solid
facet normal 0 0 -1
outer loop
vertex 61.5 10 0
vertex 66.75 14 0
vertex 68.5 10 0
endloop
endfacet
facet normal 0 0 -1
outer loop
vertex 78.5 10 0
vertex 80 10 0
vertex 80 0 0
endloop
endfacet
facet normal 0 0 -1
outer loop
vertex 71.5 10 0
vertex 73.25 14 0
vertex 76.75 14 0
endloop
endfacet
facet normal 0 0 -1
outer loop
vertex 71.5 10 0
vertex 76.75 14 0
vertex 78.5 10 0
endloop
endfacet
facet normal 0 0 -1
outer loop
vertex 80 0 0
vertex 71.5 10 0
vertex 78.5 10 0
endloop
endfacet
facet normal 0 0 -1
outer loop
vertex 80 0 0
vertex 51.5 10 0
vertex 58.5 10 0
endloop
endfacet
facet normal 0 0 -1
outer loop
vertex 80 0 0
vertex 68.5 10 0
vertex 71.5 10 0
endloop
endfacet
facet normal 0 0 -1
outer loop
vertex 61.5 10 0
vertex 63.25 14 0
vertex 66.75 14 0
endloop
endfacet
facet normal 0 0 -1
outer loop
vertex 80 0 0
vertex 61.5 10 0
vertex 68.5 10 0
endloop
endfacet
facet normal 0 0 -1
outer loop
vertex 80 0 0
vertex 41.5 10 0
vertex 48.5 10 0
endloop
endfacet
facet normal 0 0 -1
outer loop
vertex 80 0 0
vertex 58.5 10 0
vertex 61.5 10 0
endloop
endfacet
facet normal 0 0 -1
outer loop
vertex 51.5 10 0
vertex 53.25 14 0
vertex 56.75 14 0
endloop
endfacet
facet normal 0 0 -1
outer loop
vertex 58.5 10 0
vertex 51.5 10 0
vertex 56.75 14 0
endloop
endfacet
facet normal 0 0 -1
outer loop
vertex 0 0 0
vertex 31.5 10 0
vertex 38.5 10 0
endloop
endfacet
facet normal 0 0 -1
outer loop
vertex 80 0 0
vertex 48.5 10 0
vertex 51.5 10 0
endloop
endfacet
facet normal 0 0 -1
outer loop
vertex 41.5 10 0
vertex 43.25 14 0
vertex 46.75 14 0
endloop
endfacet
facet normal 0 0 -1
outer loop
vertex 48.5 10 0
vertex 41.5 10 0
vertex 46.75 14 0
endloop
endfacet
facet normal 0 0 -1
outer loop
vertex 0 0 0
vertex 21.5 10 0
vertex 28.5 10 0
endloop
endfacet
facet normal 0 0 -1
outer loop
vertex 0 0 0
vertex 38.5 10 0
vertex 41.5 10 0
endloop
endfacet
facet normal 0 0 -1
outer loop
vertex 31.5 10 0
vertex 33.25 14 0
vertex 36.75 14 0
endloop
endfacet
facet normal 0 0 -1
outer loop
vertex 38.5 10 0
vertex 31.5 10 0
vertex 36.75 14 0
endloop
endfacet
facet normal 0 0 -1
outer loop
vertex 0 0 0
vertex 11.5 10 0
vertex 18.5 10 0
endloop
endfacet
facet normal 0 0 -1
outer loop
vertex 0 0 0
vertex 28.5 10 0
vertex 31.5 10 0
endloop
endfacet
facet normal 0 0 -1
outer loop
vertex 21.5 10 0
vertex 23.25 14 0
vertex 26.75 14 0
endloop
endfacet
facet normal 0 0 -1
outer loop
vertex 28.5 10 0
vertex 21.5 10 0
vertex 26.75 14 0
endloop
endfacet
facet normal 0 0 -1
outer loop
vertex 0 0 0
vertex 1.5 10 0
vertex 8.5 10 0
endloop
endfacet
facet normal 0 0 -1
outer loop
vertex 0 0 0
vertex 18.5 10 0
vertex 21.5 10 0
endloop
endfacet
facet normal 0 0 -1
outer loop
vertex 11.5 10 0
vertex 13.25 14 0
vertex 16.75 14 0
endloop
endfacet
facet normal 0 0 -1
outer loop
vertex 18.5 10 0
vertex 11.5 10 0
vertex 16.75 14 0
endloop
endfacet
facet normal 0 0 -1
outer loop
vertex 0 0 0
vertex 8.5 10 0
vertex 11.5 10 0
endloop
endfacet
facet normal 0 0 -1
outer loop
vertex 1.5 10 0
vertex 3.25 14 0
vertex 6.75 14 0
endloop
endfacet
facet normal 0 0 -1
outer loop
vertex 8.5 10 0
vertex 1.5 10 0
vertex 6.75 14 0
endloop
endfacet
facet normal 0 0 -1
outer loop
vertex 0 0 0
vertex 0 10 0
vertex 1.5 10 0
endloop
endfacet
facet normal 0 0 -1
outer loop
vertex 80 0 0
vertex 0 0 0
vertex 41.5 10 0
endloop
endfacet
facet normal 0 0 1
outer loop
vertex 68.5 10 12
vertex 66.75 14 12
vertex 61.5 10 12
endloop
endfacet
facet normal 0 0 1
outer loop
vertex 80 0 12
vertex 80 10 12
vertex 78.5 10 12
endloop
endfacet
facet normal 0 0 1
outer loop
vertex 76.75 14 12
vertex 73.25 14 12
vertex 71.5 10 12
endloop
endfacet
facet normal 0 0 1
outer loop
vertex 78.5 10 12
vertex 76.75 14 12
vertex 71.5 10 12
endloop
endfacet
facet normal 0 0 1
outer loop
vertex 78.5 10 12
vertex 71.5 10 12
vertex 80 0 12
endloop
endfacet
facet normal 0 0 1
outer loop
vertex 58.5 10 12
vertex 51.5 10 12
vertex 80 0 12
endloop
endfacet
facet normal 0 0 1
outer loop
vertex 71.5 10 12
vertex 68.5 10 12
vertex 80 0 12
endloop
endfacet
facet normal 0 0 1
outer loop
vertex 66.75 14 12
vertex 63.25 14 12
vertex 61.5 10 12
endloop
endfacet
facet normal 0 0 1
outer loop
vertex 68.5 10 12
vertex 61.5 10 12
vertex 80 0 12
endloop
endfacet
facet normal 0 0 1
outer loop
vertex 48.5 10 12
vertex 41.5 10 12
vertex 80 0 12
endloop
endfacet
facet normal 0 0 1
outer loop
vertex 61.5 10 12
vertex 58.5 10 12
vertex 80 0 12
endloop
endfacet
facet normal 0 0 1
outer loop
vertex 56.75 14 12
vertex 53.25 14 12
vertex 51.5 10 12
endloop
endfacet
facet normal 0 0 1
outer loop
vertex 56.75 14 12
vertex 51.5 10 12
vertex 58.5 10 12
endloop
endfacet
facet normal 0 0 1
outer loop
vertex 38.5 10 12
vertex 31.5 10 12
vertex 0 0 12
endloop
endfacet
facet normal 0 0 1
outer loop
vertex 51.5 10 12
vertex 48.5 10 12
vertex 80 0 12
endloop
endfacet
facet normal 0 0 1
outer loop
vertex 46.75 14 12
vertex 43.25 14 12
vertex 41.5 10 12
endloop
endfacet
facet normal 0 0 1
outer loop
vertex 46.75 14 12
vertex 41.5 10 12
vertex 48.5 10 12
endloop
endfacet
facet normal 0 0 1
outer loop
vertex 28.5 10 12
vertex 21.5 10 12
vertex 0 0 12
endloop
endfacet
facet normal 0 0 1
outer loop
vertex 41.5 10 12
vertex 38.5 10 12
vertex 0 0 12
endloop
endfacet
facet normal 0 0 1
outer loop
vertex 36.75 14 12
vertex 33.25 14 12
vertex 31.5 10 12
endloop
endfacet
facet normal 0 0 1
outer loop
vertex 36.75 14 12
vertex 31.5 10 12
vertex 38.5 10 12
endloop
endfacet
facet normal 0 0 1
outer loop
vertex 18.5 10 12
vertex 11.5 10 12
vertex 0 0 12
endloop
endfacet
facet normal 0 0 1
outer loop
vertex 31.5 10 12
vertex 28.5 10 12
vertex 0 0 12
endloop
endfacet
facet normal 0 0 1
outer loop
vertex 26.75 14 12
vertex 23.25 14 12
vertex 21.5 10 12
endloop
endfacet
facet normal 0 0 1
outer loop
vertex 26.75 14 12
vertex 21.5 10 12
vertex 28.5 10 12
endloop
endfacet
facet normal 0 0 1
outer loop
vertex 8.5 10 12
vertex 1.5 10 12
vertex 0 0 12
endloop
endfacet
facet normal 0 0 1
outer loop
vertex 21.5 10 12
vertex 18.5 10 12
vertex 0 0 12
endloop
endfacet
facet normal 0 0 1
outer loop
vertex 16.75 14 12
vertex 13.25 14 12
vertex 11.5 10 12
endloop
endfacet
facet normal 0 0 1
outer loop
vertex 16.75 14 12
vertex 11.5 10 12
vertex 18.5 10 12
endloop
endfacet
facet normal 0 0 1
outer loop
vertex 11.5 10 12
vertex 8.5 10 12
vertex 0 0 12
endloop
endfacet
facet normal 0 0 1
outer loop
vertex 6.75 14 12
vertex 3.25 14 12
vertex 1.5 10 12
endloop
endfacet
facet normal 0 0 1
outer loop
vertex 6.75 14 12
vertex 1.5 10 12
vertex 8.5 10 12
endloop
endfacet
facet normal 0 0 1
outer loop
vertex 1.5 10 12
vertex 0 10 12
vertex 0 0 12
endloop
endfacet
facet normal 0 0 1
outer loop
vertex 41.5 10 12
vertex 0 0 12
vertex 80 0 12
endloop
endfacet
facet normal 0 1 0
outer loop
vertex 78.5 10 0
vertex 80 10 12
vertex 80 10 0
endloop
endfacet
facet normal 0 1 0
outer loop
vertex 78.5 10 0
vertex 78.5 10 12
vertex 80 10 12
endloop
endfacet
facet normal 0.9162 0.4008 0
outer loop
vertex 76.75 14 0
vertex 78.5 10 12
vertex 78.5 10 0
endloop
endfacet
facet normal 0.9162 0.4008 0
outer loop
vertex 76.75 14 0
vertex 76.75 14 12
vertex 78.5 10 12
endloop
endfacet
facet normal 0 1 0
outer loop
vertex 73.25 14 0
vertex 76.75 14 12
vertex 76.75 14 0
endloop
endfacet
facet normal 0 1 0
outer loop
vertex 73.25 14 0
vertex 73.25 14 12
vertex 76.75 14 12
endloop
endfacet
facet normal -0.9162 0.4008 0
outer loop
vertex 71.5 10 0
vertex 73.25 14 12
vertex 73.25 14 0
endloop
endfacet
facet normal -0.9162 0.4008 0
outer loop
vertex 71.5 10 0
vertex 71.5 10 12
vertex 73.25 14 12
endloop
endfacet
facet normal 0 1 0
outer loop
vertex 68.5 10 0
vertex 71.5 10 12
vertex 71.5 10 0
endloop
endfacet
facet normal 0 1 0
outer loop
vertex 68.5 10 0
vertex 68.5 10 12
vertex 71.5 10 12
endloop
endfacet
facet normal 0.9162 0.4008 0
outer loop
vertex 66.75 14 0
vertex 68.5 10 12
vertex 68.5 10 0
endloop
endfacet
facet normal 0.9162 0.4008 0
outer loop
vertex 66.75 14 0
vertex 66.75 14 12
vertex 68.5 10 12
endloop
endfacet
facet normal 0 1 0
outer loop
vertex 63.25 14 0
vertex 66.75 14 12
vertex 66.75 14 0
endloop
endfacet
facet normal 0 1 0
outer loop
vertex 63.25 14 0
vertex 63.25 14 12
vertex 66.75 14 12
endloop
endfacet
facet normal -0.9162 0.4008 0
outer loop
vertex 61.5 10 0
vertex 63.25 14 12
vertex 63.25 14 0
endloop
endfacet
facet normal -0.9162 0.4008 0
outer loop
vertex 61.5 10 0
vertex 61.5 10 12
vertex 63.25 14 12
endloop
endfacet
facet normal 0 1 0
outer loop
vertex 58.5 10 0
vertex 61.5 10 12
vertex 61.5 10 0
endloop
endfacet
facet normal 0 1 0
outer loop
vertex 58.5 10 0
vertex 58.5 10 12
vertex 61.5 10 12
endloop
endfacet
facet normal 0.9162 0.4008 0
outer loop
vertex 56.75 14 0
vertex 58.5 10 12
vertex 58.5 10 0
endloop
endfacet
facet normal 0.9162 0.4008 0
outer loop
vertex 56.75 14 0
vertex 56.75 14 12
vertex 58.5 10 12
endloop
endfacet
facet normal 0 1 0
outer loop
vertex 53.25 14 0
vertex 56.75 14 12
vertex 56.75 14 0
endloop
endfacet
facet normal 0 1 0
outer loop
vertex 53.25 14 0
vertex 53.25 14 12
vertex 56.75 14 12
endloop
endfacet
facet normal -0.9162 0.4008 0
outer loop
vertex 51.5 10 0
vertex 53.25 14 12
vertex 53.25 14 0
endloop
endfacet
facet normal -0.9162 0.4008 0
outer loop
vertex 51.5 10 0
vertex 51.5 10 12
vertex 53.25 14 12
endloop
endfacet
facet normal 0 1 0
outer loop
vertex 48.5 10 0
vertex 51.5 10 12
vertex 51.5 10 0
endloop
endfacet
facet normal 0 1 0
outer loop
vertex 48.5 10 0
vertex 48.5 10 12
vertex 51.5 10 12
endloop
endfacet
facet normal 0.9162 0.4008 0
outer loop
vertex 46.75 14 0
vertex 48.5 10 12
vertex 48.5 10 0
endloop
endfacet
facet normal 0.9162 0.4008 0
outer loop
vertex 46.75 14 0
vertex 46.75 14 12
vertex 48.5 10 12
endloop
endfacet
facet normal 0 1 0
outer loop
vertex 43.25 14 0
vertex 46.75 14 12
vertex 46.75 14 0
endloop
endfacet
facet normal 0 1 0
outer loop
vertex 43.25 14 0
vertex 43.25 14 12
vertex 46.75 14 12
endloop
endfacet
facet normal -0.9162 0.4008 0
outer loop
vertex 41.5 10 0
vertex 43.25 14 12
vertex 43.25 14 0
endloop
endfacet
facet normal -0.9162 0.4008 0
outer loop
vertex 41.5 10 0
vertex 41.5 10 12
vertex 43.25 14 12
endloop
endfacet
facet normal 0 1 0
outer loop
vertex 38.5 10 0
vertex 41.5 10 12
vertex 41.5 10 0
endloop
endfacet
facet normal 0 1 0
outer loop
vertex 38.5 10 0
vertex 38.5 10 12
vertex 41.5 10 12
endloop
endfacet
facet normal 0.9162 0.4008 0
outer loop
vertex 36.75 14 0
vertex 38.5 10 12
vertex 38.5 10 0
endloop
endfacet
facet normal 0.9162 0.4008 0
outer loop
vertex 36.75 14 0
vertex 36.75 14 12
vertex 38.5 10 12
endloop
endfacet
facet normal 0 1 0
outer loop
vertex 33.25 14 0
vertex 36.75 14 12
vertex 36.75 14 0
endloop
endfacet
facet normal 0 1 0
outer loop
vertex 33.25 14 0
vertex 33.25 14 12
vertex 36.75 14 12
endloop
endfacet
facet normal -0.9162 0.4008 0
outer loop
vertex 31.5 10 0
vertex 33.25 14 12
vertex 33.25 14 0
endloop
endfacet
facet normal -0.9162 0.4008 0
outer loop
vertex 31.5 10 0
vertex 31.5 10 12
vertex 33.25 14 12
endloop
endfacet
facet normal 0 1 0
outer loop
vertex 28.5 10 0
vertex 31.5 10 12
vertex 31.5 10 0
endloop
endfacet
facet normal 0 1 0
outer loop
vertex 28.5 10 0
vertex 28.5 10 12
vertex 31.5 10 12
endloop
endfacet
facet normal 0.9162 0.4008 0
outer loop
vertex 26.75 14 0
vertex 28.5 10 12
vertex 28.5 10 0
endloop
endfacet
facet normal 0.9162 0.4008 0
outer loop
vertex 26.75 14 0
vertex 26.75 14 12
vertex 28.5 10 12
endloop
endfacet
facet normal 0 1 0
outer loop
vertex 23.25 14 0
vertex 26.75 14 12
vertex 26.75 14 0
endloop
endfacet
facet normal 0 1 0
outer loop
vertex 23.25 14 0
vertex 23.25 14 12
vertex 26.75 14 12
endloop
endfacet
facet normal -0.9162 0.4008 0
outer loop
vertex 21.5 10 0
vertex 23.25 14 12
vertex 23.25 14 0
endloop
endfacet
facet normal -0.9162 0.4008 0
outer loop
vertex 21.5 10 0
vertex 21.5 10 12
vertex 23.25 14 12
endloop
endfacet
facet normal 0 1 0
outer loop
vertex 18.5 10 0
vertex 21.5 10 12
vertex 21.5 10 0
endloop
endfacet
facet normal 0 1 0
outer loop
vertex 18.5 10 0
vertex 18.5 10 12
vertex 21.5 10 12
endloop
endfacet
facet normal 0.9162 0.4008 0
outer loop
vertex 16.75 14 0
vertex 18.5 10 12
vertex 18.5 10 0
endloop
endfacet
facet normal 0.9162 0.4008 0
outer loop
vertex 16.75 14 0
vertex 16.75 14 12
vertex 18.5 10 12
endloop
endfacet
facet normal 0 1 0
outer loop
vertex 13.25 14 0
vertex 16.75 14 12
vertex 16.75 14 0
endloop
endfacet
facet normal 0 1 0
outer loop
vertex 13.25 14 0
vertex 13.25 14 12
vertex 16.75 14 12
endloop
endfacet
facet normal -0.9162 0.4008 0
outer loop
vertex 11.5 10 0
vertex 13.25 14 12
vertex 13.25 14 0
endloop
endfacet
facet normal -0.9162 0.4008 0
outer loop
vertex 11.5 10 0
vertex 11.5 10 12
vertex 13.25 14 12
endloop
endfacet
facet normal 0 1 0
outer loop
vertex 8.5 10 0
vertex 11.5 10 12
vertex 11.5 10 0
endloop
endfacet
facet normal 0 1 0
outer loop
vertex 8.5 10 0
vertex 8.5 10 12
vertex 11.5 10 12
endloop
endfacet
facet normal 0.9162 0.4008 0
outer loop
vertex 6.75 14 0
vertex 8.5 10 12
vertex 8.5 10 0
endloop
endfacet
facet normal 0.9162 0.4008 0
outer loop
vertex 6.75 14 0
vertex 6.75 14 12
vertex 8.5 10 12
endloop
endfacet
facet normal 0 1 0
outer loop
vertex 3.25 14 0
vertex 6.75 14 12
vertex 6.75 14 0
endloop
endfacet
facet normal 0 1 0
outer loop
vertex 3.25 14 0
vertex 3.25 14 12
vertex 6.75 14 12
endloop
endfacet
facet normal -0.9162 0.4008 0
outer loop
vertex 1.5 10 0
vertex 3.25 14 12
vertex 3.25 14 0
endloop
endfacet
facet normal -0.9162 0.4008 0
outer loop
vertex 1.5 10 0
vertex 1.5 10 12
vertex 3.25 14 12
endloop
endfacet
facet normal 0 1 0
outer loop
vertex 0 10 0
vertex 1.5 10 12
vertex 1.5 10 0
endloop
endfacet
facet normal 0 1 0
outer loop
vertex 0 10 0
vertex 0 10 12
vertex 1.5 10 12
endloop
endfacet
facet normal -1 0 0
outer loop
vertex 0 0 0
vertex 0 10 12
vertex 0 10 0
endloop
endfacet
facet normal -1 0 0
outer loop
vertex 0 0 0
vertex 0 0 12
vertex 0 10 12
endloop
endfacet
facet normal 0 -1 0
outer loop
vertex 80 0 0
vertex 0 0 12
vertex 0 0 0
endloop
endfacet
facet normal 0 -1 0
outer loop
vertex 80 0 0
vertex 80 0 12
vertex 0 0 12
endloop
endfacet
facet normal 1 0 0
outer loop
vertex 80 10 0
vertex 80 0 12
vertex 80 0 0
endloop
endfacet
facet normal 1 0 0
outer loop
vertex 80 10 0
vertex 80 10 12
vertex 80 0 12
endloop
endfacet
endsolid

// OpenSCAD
$fn = 32;

// ----------------------------------------------------------------------
// Gear rack: 8 teeth, pitch 10 mm
// ----------------------------------------------------------------------

// --- parameters (mm) ---
teeth = 8;                // number of teeth
pitch = 10;               // tooth pitch, X
root_w = 7;               // tooth width at the root
tip_w = 3.5;              // tooth width at the tip
base_h = 10;              // rack body height, Y
tooth_h = 4;              // tooth height above the body
plate_t = 12;             // rack width, Z (extrusion height)

rack_l = teeth * pitch;  // overall length
total_h = base_h + tooth_h;  // overall height

profile = [[0, 0], [80, 0], [80, 10], [78.5, 10], [76.75, 14], [73.25, 14], [71.5, 10], [68.5, 10], [66.75, 14], [63.25, 14], [61.5, 10], [58.5, 10], [56.75, 14], [53.25, 14], [51.5, 10], [48.5, 10], [46.75, 14], [43.25, 14], [41.5, 10], [38.5, 10], [36.75, 14], [33.25, 14], [31.5, 10], [28.5, 10], [26.75, 14], [23.25, 14], [21.5, 10], [18.5, 10], [16.75, 14], [13.25, 14], [11.5, 10], [8.5, 10], [6.75, 14], [3.25, 14], [1.5, 10], [0, 10]];  // primary outline, 36 points, counter clockwise

// --- the one profile operation ---
linear_extrude(height = plate_t) polygon(points = profile);
